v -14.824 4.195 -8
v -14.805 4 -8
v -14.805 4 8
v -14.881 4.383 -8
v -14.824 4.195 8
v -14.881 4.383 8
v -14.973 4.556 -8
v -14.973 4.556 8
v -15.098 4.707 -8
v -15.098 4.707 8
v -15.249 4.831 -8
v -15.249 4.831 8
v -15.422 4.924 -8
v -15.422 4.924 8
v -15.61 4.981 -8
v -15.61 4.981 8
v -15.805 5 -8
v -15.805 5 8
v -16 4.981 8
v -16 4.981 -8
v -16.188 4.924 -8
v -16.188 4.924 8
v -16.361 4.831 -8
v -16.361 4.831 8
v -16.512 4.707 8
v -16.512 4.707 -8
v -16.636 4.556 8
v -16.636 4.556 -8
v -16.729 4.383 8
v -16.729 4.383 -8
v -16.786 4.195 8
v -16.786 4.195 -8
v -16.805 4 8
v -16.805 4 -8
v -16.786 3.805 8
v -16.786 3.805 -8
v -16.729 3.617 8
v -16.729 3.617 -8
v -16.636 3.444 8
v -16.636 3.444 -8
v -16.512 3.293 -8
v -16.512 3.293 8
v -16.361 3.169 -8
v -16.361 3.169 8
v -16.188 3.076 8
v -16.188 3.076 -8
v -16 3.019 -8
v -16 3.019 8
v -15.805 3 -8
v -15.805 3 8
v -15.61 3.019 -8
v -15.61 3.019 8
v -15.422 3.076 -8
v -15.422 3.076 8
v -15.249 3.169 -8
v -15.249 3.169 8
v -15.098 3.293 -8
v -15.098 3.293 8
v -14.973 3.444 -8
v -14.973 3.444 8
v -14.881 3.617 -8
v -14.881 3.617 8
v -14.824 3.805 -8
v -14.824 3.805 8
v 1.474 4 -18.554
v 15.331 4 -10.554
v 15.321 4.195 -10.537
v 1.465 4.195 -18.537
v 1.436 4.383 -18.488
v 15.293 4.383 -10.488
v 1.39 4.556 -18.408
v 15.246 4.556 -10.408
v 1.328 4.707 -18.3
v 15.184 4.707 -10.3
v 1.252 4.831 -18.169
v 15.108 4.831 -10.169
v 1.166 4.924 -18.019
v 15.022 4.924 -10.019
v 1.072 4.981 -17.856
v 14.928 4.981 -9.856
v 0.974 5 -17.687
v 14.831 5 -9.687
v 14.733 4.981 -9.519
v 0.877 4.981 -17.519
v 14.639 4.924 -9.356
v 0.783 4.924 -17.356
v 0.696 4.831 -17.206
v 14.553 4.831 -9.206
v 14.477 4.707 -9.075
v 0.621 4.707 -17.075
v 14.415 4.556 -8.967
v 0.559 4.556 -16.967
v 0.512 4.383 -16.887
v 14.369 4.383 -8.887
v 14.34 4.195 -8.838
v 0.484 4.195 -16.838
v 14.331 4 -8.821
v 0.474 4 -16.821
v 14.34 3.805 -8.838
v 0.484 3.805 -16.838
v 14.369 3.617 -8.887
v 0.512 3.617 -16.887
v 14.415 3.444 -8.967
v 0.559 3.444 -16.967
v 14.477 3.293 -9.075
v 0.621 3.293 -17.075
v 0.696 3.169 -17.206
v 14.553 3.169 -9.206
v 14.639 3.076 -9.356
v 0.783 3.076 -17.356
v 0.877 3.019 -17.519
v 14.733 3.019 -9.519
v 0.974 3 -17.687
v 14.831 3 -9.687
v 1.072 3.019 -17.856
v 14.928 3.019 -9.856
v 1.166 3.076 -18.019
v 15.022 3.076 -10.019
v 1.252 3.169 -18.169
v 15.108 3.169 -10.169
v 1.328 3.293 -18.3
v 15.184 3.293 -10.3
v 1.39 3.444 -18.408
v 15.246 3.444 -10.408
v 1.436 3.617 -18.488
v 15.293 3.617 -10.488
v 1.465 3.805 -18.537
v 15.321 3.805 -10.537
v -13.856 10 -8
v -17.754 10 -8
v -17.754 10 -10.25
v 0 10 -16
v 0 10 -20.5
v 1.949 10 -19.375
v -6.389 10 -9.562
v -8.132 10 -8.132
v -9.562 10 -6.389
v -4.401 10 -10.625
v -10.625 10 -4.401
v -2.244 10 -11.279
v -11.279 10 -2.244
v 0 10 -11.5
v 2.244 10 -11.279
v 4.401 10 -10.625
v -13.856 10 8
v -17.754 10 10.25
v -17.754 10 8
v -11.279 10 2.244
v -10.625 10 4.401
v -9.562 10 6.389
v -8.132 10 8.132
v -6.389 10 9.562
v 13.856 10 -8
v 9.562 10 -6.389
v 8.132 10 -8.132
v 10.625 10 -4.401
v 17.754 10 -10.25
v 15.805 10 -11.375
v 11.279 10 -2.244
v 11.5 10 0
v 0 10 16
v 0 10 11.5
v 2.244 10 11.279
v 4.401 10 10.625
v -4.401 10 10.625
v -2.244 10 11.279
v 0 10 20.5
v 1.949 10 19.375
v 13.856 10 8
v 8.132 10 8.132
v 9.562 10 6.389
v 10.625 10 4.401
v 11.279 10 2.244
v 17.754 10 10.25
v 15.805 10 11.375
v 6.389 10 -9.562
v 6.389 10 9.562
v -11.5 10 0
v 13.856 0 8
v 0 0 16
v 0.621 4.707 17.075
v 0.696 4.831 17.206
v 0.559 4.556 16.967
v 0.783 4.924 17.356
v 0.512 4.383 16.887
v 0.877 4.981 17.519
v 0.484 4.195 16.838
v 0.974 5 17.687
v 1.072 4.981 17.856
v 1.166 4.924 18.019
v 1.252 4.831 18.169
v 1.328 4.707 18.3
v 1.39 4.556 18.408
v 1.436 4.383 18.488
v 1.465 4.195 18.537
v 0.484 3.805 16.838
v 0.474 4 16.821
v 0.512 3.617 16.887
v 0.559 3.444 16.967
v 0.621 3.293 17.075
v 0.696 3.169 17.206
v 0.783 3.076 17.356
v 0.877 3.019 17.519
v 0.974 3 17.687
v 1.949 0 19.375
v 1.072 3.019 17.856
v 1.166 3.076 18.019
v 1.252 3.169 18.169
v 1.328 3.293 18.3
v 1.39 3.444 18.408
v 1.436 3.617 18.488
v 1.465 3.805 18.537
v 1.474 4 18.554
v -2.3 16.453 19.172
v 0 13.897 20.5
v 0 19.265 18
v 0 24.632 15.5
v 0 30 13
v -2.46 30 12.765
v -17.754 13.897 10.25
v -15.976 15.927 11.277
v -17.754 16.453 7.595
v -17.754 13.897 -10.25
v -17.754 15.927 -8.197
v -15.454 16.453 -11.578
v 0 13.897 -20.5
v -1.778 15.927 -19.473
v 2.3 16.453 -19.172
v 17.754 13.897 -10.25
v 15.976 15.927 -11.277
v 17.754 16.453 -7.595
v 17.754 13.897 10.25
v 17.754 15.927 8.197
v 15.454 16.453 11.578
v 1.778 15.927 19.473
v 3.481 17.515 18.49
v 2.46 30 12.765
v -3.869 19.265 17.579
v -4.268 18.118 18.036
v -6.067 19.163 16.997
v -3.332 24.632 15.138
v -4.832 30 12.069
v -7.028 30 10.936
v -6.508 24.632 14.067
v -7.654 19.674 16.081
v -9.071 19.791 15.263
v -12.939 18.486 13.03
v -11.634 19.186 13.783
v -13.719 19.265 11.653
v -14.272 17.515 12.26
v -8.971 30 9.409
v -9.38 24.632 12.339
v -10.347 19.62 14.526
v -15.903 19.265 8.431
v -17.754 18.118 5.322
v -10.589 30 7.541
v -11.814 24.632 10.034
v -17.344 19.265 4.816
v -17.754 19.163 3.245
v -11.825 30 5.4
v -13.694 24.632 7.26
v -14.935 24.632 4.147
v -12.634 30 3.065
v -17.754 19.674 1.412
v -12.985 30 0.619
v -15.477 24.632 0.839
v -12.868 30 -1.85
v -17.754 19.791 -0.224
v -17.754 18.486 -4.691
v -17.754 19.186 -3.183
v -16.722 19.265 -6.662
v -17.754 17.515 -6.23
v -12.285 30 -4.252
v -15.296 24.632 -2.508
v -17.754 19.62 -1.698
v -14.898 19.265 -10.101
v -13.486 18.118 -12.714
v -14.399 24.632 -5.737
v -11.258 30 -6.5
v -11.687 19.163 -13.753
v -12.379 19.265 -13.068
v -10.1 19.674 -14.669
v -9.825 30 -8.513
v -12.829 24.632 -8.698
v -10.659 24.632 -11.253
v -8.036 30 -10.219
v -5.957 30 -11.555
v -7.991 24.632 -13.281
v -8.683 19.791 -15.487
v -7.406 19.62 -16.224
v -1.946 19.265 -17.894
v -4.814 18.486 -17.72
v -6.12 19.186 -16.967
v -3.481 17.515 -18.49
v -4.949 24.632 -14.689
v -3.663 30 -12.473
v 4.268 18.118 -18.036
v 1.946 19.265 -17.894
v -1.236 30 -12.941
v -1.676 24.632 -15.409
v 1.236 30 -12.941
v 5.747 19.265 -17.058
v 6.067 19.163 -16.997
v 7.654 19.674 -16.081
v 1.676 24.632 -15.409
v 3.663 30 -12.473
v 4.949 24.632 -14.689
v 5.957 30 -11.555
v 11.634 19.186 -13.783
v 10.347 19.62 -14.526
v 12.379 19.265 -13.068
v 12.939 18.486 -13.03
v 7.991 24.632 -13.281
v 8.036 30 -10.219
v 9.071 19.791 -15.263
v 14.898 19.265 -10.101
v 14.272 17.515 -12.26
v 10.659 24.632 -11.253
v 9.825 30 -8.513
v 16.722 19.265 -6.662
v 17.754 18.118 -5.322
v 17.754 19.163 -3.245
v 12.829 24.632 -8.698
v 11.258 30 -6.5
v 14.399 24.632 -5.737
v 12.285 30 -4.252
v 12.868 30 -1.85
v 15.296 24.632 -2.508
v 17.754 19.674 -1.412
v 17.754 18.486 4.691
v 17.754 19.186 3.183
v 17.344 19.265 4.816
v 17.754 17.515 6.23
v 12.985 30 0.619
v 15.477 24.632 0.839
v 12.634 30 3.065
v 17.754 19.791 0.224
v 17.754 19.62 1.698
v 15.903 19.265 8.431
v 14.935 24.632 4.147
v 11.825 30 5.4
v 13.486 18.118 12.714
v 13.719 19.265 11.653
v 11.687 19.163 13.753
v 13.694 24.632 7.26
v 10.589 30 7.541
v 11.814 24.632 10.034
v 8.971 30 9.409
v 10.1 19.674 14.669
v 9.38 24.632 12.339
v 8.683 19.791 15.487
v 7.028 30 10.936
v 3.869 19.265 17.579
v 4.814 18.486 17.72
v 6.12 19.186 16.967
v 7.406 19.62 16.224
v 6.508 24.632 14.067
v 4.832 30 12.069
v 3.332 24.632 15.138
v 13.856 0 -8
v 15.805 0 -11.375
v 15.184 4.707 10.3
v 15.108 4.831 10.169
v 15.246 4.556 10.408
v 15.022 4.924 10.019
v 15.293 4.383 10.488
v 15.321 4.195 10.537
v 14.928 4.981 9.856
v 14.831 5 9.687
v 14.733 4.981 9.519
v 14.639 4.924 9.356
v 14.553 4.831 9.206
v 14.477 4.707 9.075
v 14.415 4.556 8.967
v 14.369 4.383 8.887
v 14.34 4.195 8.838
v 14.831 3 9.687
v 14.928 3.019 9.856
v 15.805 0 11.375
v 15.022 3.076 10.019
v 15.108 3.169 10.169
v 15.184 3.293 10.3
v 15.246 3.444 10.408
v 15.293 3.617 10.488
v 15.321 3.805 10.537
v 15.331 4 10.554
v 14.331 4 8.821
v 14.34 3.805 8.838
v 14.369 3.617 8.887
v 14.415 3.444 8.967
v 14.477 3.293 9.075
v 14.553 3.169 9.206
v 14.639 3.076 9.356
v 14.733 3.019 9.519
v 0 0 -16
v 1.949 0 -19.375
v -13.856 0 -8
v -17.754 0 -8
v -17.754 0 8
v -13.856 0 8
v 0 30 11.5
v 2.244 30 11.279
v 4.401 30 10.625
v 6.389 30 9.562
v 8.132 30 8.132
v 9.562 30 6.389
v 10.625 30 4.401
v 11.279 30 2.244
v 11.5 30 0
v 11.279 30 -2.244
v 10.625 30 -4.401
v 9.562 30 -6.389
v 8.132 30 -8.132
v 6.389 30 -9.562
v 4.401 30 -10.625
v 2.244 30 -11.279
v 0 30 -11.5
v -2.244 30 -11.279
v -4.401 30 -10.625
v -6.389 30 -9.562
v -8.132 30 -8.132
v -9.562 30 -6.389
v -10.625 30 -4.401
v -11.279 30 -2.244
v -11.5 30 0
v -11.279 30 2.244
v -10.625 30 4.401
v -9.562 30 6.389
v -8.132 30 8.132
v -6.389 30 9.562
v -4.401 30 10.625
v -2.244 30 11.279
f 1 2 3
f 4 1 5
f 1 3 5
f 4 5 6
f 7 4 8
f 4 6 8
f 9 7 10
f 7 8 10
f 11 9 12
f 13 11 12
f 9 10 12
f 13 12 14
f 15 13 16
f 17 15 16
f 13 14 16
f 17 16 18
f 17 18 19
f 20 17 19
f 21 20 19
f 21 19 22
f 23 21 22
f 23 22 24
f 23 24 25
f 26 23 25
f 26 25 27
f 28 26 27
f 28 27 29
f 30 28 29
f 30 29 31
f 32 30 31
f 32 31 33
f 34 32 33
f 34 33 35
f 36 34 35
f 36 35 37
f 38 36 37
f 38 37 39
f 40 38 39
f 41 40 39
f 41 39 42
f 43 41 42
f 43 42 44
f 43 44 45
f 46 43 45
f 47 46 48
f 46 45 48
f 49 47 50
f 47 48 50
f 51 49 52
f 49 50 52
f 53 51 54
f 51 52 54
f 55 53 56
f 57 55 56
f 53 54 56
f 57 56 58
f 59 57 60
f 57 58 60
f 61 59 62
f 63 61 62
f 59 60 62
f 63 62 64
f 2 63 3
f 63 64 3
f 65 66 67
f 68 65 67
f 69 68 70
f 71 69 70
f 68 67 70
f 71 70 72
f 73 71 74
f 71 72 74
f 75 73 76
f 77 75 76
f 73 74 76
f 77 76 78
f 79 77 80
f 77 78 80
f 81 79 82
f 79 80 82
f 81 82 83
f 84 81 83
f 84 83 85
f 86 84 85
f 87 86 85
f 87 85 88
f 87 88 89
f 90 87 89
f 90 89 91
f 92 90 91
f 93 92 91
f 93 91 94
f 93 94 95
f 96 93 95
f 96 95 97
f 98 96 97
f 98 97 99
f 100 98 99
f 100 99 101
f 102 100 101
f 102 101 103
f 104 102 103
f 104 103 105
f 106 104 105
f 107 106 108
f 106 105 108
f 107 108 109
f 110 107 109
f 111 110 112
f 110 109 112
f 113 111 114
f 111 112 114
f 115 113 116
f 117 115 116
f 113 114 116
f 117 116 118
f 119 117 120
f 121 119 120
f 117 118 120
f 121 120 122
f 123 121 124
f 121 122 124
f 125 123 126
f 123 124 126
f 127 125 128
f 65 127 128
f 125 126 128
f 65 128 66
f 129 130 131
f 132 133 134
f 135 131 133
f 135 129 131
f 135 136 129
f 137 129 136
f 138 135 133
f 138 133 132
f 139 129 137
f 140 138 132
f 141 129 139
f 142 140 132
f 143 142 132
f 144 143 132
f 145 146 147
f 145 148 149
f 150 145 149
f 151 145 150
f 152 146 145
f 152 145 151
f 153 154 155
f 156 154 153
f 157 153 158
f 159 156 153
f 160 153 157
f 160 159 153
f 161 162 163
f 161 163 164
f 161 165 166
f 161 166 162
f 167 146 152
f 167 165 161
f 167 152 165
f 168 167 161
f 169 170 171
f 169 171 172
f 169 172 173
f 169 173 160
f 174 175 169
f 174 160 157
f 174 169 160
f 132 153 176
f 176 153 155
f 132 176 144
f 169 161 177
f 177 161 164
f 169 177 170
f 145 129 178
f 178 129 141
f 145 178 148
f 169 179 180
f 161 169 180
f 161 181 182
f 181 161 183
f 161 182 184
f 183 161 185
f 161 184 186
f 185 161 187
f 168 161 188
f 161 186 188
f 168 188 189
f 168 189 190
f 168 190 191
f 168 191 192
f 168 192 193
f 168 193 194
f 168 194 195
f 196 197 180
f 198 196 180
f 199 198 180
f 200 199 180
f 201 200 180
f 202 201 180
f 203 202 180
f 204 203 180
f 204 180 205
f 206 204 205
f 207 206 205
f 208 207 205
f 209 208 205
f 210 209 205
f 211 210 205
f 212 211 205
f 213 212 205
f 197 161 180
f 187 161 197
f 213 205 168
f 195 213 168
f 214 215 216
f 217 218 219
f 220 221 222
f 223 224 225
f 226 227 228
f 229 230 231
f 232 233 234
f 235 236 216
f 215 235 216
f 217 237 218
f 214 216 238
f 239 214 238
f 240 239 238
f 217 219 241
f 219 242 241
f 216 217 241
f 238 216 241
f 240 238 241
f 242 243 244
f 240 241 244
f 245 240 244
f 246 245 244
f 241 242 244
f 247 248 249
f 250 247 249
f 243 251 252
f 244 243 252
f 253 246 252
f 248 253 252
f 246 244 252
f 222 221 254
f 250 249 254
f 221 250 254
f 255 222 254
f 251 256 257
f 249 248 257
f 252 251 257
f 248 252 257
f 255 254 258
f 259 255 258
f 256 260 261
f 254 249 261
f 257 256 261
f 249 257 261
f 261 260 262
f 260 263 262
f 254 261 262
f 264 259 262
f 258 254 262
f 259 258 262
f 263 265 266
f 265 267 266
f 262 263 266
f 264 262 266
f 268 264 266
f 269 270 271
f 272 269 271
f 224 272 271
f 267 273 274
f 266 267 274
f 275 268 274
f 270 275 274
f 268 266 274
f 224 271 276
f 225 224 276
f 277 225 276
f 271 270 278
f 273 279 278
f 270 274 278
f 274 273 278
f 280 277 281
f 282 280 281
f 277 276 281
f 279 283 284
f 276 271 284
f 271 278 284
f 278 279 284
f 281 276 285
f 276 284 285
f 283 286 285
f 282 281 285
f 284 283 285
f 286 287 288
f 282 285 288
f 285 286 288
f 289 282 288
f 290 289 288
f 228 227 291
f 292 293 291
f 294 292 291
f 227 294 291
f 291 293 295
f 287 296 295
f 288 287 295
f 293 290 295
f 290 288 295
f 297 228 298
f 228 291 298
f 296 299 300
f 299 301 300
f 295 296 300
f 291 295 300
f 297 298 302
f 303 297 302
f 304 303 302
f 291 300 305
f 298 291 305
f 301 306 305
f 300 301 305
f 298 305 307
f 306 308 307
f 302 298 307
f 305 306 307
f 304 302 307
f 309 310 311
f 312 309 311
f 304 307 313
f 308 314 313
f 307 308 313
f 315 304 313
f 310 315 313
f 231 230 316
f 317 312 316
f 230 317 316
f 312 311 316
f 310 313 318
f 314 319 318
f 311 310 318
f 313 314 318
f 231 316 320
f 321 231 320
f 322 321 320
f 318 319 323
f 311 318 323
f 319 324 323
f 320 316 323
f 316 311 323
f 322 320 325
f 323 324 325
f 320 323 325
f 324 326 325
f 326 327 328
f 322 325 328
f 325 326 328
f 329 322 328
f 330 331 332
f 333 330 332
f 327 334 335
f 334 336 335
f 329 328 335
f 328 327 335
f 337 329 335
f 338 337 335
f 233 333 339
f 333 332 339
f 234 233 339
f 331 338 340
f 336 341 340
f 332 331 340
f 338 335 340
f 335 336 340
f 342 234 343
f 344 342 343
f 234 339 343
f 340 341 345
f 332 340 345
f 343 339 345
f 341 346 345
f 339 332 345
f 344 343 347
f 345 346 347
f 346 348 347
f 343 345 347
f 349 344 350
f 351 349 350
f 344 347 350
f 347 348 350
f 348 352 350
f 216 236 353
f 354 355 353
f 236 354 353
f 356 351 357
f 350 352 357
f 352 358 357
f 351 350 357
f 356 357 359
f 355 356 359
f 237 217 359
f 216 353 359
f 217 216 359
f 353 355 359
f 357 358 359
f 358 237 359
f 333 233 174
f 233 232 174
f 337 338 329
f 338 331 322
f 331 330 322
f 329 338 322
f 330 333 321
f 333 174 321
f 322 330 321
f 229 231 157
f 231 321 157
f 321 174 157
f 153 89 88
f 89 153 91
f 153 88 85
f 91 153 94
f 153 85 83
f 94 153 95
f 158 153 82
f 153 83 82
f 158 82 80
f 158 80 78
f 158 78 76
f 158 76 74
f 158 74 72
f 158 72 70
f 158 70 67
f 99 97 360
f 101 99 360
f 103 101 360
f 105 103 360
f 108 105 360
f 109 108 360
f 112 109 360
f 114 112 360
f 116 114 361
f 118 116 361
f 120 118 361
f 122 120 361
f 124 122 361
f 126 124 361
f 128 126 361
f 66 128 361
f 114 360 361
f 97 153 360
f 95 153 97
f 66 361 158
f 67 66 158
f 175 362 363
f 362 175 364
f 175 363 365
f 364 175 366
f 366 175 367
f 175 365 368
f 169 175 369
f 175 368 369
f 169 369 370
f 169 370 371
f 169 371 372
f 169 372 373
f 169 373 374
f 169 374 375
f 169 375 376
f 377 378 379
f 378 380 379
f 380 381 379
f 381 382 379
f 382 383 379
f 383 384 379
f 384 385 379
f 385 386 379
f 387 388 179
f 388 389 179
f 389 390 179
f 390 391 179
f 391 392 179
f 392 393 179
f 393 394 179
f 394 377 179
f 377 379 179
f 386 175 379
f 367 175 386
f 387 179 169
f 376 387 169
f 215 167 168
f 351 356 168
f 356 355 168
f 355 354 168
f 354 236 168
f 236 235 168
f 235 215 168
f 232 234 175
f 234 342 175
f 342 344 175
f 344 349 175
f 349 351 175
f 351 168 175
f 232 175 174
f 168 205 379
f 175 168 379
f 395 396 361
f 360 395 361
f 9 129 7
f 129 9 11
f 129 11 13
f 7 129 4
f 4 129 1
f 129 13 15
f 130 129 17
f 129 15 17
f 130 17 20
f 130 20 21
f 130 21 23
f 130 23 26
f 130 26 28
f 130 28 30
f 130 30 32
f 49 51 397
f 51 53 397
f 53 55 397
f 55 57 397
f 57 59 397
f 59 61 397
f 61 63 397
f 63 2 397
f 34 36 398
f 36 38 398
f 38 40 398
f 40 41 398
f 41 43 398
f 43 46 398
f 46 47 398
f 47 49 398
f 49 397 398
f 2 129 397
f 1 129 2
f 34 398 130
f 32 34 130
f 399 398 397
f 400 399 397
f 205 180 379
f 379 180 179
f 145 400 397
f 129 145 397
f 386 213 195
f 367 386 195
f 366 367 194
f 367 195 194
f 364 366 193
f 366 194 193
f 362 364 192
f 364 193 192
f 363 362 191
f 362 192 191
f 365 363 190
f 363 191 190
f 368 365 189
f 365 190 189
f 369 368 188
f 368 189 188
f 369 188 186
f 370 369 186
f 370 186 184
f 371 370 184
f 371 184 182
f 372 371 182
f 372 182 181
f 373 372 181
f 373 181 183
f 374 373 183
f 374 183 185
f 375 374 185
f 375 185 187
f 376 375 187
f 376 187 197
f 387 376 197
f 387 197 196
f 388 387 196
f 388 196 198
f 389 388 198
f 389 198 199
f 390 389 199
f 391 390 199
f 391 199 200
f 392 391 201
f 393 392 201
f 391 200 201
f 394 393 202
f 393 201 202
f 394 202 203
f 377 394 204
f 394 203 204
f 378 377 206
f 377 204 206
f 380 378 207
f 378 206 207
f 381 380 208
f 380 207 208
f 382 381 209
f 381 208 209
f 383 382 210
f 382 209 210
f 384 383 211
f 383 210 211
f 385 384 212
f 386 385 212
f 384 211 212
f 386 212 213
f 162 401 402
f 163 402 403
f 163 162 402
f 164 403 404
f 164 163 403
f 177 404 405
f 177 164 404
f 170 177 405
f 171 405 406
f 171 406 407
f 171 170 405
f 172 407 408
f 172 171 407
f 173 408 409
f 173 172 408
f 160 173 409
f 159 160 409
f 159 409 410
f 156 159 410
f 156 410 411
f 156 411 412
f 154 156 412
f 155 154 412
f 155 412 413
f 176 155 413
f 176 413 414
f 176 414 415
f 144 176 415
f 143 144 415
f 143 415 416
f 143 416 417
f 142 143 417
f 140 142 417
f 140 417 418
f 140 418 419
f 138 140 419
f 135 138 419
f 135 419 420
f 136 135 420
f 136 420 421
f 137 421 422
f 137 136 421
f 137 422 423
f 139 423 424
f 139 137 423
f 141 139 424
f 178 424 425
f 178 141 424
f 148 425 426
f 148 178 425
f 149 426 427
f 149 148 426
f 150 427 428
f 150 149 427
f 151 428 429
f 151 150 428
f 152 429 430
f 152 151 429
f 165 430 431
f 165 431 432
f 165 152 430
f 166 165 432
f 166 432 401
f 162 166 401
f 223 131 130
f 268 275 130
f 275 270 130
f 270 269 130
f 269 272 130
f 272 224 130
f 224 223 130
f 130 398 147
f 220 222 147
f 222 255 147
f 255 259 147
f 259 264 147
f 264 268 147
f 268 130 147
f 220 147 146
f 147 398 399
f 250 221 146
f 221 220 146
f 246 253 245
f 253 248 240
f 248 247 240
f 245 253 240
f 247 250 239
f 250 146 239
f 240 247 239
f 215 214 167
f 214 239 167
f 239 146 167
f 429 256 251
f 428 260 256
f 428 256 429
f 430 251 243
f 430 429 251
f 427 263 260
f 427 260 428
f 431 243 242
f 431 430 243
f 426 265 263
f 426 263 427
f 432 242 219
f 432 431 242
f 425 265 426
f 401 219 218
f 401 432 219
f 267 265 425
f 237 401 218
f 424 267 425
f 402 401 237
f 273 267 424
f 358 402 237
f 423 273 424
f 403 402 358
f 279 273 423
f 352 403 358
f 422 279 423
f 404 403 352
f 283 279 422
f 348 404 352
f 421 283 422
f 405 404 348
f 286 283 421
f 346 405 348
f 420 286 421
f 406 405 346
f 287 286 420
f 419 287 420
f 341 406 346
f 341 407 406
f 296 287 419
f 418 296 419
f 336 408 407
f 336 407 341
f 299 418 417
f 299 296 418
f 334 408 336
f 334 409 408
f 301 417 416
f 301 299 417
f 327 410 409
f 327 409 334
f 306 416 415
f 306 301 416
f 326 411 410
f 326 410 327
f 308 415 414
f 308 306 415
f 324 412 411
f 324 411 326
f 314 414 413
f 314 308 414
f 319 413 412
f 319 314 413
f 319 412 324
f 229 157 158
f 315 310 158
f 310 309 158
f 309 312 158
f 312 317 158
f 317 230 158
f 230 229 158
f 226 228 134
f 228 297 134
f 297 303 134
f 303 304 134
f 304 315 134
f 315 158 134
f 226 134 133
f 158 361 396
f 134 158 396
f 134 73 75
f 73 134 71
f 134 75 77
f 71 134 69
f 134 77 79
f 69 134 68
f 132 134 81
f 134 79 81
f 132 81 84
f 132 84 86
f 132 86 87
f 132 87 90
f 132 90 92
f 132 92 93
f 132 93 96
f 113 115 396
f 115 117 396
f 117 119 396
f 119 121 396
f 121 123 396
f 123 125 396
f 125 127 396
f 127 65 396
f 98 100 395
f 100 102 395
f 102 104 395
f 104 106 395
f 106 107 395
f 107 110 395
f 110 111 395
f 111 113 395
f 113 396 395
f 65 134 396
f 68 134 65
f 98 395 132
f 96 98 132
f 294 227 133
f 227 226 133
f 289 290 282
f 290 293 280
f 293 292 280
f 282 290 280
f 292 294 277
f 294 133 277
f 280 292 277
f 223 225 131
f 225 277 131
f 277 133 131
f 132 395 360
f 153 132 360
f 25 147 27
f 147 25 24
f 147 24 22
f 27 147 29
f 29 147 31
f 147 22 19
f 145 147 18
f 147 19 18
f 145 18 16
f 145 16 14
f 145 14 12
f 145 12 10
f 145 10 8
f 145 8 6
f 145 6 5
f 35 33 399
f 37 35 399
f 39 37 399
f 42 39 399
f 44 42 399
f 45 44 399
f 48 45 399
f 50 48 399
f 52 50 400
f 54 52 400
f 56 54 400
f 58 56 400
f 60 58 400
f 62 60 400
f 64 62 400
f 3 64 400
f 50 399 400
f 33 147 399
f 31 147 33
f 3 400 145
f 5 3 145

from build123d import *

# Parameters (mm, degrees)
SKETCH1_R           = 11.5
BOSS_EXTRUDE1_DEPTH = 30
SKETCH4_R           = 11.5
CUT_EXTRUDE1_DEPTH  = 10
SKETCH5_R           = 1
CUT_EXTRUDE2_DEPTH  = 46.027075188
SKETCH6_R           = 1
CUT_EXTRUDE3_DEPTH  = 46.928613086
SKETCH7_R           = 1
CUT_EXTRUDE4_DEPTH  = 46.928613086


with BuildPart() as part:
    # Sketch1 → Boss-Extrude1 (new body)
    with BuildSketch(Plane(origin=(0, 0, 0), x_dir=(1, 0, 0), z_dir=(0, 1, 0))):
        Polygon((0, 20.5), (-17.753520778, 10.25), (-17.753520778, -10.25), (0, -20.5), (17.753520778, -10.25), (17.753520778, 10.25), align=None)
        with Locations(Location((0, 0, 0), (0, 0, 270))):
            Circle(SKETCH1_R, mode=Mode.SUBTRACT)
    extrude(amount=BOSS_EXTRUDE1_DEPTH)

    # Sketch2 → Cut-Revolve1 (revolve, cut)
    with BuildSketch(Plane.XY, mode=Mode.PRIVATE) as cut_revolve1_sk:
        Polygon((20.5, 13.897411558), (13, 30), (0, 30), (0, 31.097791256), (25.351389146, 31.097791256), (24.973358823, 13.897411558), align=None)
    revolve(cut_revolve1_sk.sketch.rotate(Axis((0, 30, 0), (0, -1, 0)), 90), axis=Axis((0, 30, 0), (0, -1, 0)), mode=Mode.SUBTRACT)

    # Sketch4 → Cut-Extrude1 (cut)
    with BuildSketch(Plane.XZ):
        Polygon((-13.856406461, -8), (-17.753520778, -8), (-17.753520778, -10.25), (0, -20.5), (1.948557159, -19.375), (0, -16), (13.856406461, -8), (15.804963619, -11.375), (17.753520778, -10.25), (17.753520778, 10.25), (15.804963619, 11.375), (13.856406461, 8), (0, 16), (1.948557159, 19.375), (0, 20.5), (-17.753520778, 10.25), (-17.753520778, 8), (-13.856406461, 8), align=None)
        with Locations(Location((0, 0, 0), (0, 0, 270))):
            Circle(SKETCH4_R, mode=Mode.SUBTRACT)
    extrude(amount=-CUT_EXTRUDE1_DEPTH, mode=Mode.SUBTRACT)

    # Sketch5 → Cut-Extrude2 (cut, through all)
    with BuildSketch(Plane.XY.offset(8)):
        with Locations((-15.804963619, 4)):
            Circle(SKETCH5_R)
    extrude(amount=-CUT_EXTRUDE2_DEPTH, mode=Mode.SUBTRACT)

    # Sketch6 → Cut-Extrude3 (cut, through all)
    with BuildSketch(Plane(origin=(-6.92820323, 0, 4), x_dir=(0.5000000000000042, 0, 0.8660254037844363), z_dir=(-0.8660254037844362, 0, 0.5000000000000041))):
        with Locations((15.804963619, 4)):
            Circle(SKETCH6_R)
    extrude(amount=-CUT_EXTRUDE3_DEPTH, mode=Mode.SUBTRACT)

    # Sketch7 → Cut-Extrude4 (cut, through all)
    with BuildSketch(Plane(origin=(6.92820323, 0, 4), x_dir=(0.4999999999999912, 0, -0.8660254037844437), z_dir=(0.8660254037844437, 0, 0.4999999999999912))):
        with Locations((15.804963619, 4)):
            Circle(SKETCH7_R)
    extrude(amount=-CUT_EXTRUDE4_DEPTH, mode=Mode.SUBTRACT)


solid = part.part
